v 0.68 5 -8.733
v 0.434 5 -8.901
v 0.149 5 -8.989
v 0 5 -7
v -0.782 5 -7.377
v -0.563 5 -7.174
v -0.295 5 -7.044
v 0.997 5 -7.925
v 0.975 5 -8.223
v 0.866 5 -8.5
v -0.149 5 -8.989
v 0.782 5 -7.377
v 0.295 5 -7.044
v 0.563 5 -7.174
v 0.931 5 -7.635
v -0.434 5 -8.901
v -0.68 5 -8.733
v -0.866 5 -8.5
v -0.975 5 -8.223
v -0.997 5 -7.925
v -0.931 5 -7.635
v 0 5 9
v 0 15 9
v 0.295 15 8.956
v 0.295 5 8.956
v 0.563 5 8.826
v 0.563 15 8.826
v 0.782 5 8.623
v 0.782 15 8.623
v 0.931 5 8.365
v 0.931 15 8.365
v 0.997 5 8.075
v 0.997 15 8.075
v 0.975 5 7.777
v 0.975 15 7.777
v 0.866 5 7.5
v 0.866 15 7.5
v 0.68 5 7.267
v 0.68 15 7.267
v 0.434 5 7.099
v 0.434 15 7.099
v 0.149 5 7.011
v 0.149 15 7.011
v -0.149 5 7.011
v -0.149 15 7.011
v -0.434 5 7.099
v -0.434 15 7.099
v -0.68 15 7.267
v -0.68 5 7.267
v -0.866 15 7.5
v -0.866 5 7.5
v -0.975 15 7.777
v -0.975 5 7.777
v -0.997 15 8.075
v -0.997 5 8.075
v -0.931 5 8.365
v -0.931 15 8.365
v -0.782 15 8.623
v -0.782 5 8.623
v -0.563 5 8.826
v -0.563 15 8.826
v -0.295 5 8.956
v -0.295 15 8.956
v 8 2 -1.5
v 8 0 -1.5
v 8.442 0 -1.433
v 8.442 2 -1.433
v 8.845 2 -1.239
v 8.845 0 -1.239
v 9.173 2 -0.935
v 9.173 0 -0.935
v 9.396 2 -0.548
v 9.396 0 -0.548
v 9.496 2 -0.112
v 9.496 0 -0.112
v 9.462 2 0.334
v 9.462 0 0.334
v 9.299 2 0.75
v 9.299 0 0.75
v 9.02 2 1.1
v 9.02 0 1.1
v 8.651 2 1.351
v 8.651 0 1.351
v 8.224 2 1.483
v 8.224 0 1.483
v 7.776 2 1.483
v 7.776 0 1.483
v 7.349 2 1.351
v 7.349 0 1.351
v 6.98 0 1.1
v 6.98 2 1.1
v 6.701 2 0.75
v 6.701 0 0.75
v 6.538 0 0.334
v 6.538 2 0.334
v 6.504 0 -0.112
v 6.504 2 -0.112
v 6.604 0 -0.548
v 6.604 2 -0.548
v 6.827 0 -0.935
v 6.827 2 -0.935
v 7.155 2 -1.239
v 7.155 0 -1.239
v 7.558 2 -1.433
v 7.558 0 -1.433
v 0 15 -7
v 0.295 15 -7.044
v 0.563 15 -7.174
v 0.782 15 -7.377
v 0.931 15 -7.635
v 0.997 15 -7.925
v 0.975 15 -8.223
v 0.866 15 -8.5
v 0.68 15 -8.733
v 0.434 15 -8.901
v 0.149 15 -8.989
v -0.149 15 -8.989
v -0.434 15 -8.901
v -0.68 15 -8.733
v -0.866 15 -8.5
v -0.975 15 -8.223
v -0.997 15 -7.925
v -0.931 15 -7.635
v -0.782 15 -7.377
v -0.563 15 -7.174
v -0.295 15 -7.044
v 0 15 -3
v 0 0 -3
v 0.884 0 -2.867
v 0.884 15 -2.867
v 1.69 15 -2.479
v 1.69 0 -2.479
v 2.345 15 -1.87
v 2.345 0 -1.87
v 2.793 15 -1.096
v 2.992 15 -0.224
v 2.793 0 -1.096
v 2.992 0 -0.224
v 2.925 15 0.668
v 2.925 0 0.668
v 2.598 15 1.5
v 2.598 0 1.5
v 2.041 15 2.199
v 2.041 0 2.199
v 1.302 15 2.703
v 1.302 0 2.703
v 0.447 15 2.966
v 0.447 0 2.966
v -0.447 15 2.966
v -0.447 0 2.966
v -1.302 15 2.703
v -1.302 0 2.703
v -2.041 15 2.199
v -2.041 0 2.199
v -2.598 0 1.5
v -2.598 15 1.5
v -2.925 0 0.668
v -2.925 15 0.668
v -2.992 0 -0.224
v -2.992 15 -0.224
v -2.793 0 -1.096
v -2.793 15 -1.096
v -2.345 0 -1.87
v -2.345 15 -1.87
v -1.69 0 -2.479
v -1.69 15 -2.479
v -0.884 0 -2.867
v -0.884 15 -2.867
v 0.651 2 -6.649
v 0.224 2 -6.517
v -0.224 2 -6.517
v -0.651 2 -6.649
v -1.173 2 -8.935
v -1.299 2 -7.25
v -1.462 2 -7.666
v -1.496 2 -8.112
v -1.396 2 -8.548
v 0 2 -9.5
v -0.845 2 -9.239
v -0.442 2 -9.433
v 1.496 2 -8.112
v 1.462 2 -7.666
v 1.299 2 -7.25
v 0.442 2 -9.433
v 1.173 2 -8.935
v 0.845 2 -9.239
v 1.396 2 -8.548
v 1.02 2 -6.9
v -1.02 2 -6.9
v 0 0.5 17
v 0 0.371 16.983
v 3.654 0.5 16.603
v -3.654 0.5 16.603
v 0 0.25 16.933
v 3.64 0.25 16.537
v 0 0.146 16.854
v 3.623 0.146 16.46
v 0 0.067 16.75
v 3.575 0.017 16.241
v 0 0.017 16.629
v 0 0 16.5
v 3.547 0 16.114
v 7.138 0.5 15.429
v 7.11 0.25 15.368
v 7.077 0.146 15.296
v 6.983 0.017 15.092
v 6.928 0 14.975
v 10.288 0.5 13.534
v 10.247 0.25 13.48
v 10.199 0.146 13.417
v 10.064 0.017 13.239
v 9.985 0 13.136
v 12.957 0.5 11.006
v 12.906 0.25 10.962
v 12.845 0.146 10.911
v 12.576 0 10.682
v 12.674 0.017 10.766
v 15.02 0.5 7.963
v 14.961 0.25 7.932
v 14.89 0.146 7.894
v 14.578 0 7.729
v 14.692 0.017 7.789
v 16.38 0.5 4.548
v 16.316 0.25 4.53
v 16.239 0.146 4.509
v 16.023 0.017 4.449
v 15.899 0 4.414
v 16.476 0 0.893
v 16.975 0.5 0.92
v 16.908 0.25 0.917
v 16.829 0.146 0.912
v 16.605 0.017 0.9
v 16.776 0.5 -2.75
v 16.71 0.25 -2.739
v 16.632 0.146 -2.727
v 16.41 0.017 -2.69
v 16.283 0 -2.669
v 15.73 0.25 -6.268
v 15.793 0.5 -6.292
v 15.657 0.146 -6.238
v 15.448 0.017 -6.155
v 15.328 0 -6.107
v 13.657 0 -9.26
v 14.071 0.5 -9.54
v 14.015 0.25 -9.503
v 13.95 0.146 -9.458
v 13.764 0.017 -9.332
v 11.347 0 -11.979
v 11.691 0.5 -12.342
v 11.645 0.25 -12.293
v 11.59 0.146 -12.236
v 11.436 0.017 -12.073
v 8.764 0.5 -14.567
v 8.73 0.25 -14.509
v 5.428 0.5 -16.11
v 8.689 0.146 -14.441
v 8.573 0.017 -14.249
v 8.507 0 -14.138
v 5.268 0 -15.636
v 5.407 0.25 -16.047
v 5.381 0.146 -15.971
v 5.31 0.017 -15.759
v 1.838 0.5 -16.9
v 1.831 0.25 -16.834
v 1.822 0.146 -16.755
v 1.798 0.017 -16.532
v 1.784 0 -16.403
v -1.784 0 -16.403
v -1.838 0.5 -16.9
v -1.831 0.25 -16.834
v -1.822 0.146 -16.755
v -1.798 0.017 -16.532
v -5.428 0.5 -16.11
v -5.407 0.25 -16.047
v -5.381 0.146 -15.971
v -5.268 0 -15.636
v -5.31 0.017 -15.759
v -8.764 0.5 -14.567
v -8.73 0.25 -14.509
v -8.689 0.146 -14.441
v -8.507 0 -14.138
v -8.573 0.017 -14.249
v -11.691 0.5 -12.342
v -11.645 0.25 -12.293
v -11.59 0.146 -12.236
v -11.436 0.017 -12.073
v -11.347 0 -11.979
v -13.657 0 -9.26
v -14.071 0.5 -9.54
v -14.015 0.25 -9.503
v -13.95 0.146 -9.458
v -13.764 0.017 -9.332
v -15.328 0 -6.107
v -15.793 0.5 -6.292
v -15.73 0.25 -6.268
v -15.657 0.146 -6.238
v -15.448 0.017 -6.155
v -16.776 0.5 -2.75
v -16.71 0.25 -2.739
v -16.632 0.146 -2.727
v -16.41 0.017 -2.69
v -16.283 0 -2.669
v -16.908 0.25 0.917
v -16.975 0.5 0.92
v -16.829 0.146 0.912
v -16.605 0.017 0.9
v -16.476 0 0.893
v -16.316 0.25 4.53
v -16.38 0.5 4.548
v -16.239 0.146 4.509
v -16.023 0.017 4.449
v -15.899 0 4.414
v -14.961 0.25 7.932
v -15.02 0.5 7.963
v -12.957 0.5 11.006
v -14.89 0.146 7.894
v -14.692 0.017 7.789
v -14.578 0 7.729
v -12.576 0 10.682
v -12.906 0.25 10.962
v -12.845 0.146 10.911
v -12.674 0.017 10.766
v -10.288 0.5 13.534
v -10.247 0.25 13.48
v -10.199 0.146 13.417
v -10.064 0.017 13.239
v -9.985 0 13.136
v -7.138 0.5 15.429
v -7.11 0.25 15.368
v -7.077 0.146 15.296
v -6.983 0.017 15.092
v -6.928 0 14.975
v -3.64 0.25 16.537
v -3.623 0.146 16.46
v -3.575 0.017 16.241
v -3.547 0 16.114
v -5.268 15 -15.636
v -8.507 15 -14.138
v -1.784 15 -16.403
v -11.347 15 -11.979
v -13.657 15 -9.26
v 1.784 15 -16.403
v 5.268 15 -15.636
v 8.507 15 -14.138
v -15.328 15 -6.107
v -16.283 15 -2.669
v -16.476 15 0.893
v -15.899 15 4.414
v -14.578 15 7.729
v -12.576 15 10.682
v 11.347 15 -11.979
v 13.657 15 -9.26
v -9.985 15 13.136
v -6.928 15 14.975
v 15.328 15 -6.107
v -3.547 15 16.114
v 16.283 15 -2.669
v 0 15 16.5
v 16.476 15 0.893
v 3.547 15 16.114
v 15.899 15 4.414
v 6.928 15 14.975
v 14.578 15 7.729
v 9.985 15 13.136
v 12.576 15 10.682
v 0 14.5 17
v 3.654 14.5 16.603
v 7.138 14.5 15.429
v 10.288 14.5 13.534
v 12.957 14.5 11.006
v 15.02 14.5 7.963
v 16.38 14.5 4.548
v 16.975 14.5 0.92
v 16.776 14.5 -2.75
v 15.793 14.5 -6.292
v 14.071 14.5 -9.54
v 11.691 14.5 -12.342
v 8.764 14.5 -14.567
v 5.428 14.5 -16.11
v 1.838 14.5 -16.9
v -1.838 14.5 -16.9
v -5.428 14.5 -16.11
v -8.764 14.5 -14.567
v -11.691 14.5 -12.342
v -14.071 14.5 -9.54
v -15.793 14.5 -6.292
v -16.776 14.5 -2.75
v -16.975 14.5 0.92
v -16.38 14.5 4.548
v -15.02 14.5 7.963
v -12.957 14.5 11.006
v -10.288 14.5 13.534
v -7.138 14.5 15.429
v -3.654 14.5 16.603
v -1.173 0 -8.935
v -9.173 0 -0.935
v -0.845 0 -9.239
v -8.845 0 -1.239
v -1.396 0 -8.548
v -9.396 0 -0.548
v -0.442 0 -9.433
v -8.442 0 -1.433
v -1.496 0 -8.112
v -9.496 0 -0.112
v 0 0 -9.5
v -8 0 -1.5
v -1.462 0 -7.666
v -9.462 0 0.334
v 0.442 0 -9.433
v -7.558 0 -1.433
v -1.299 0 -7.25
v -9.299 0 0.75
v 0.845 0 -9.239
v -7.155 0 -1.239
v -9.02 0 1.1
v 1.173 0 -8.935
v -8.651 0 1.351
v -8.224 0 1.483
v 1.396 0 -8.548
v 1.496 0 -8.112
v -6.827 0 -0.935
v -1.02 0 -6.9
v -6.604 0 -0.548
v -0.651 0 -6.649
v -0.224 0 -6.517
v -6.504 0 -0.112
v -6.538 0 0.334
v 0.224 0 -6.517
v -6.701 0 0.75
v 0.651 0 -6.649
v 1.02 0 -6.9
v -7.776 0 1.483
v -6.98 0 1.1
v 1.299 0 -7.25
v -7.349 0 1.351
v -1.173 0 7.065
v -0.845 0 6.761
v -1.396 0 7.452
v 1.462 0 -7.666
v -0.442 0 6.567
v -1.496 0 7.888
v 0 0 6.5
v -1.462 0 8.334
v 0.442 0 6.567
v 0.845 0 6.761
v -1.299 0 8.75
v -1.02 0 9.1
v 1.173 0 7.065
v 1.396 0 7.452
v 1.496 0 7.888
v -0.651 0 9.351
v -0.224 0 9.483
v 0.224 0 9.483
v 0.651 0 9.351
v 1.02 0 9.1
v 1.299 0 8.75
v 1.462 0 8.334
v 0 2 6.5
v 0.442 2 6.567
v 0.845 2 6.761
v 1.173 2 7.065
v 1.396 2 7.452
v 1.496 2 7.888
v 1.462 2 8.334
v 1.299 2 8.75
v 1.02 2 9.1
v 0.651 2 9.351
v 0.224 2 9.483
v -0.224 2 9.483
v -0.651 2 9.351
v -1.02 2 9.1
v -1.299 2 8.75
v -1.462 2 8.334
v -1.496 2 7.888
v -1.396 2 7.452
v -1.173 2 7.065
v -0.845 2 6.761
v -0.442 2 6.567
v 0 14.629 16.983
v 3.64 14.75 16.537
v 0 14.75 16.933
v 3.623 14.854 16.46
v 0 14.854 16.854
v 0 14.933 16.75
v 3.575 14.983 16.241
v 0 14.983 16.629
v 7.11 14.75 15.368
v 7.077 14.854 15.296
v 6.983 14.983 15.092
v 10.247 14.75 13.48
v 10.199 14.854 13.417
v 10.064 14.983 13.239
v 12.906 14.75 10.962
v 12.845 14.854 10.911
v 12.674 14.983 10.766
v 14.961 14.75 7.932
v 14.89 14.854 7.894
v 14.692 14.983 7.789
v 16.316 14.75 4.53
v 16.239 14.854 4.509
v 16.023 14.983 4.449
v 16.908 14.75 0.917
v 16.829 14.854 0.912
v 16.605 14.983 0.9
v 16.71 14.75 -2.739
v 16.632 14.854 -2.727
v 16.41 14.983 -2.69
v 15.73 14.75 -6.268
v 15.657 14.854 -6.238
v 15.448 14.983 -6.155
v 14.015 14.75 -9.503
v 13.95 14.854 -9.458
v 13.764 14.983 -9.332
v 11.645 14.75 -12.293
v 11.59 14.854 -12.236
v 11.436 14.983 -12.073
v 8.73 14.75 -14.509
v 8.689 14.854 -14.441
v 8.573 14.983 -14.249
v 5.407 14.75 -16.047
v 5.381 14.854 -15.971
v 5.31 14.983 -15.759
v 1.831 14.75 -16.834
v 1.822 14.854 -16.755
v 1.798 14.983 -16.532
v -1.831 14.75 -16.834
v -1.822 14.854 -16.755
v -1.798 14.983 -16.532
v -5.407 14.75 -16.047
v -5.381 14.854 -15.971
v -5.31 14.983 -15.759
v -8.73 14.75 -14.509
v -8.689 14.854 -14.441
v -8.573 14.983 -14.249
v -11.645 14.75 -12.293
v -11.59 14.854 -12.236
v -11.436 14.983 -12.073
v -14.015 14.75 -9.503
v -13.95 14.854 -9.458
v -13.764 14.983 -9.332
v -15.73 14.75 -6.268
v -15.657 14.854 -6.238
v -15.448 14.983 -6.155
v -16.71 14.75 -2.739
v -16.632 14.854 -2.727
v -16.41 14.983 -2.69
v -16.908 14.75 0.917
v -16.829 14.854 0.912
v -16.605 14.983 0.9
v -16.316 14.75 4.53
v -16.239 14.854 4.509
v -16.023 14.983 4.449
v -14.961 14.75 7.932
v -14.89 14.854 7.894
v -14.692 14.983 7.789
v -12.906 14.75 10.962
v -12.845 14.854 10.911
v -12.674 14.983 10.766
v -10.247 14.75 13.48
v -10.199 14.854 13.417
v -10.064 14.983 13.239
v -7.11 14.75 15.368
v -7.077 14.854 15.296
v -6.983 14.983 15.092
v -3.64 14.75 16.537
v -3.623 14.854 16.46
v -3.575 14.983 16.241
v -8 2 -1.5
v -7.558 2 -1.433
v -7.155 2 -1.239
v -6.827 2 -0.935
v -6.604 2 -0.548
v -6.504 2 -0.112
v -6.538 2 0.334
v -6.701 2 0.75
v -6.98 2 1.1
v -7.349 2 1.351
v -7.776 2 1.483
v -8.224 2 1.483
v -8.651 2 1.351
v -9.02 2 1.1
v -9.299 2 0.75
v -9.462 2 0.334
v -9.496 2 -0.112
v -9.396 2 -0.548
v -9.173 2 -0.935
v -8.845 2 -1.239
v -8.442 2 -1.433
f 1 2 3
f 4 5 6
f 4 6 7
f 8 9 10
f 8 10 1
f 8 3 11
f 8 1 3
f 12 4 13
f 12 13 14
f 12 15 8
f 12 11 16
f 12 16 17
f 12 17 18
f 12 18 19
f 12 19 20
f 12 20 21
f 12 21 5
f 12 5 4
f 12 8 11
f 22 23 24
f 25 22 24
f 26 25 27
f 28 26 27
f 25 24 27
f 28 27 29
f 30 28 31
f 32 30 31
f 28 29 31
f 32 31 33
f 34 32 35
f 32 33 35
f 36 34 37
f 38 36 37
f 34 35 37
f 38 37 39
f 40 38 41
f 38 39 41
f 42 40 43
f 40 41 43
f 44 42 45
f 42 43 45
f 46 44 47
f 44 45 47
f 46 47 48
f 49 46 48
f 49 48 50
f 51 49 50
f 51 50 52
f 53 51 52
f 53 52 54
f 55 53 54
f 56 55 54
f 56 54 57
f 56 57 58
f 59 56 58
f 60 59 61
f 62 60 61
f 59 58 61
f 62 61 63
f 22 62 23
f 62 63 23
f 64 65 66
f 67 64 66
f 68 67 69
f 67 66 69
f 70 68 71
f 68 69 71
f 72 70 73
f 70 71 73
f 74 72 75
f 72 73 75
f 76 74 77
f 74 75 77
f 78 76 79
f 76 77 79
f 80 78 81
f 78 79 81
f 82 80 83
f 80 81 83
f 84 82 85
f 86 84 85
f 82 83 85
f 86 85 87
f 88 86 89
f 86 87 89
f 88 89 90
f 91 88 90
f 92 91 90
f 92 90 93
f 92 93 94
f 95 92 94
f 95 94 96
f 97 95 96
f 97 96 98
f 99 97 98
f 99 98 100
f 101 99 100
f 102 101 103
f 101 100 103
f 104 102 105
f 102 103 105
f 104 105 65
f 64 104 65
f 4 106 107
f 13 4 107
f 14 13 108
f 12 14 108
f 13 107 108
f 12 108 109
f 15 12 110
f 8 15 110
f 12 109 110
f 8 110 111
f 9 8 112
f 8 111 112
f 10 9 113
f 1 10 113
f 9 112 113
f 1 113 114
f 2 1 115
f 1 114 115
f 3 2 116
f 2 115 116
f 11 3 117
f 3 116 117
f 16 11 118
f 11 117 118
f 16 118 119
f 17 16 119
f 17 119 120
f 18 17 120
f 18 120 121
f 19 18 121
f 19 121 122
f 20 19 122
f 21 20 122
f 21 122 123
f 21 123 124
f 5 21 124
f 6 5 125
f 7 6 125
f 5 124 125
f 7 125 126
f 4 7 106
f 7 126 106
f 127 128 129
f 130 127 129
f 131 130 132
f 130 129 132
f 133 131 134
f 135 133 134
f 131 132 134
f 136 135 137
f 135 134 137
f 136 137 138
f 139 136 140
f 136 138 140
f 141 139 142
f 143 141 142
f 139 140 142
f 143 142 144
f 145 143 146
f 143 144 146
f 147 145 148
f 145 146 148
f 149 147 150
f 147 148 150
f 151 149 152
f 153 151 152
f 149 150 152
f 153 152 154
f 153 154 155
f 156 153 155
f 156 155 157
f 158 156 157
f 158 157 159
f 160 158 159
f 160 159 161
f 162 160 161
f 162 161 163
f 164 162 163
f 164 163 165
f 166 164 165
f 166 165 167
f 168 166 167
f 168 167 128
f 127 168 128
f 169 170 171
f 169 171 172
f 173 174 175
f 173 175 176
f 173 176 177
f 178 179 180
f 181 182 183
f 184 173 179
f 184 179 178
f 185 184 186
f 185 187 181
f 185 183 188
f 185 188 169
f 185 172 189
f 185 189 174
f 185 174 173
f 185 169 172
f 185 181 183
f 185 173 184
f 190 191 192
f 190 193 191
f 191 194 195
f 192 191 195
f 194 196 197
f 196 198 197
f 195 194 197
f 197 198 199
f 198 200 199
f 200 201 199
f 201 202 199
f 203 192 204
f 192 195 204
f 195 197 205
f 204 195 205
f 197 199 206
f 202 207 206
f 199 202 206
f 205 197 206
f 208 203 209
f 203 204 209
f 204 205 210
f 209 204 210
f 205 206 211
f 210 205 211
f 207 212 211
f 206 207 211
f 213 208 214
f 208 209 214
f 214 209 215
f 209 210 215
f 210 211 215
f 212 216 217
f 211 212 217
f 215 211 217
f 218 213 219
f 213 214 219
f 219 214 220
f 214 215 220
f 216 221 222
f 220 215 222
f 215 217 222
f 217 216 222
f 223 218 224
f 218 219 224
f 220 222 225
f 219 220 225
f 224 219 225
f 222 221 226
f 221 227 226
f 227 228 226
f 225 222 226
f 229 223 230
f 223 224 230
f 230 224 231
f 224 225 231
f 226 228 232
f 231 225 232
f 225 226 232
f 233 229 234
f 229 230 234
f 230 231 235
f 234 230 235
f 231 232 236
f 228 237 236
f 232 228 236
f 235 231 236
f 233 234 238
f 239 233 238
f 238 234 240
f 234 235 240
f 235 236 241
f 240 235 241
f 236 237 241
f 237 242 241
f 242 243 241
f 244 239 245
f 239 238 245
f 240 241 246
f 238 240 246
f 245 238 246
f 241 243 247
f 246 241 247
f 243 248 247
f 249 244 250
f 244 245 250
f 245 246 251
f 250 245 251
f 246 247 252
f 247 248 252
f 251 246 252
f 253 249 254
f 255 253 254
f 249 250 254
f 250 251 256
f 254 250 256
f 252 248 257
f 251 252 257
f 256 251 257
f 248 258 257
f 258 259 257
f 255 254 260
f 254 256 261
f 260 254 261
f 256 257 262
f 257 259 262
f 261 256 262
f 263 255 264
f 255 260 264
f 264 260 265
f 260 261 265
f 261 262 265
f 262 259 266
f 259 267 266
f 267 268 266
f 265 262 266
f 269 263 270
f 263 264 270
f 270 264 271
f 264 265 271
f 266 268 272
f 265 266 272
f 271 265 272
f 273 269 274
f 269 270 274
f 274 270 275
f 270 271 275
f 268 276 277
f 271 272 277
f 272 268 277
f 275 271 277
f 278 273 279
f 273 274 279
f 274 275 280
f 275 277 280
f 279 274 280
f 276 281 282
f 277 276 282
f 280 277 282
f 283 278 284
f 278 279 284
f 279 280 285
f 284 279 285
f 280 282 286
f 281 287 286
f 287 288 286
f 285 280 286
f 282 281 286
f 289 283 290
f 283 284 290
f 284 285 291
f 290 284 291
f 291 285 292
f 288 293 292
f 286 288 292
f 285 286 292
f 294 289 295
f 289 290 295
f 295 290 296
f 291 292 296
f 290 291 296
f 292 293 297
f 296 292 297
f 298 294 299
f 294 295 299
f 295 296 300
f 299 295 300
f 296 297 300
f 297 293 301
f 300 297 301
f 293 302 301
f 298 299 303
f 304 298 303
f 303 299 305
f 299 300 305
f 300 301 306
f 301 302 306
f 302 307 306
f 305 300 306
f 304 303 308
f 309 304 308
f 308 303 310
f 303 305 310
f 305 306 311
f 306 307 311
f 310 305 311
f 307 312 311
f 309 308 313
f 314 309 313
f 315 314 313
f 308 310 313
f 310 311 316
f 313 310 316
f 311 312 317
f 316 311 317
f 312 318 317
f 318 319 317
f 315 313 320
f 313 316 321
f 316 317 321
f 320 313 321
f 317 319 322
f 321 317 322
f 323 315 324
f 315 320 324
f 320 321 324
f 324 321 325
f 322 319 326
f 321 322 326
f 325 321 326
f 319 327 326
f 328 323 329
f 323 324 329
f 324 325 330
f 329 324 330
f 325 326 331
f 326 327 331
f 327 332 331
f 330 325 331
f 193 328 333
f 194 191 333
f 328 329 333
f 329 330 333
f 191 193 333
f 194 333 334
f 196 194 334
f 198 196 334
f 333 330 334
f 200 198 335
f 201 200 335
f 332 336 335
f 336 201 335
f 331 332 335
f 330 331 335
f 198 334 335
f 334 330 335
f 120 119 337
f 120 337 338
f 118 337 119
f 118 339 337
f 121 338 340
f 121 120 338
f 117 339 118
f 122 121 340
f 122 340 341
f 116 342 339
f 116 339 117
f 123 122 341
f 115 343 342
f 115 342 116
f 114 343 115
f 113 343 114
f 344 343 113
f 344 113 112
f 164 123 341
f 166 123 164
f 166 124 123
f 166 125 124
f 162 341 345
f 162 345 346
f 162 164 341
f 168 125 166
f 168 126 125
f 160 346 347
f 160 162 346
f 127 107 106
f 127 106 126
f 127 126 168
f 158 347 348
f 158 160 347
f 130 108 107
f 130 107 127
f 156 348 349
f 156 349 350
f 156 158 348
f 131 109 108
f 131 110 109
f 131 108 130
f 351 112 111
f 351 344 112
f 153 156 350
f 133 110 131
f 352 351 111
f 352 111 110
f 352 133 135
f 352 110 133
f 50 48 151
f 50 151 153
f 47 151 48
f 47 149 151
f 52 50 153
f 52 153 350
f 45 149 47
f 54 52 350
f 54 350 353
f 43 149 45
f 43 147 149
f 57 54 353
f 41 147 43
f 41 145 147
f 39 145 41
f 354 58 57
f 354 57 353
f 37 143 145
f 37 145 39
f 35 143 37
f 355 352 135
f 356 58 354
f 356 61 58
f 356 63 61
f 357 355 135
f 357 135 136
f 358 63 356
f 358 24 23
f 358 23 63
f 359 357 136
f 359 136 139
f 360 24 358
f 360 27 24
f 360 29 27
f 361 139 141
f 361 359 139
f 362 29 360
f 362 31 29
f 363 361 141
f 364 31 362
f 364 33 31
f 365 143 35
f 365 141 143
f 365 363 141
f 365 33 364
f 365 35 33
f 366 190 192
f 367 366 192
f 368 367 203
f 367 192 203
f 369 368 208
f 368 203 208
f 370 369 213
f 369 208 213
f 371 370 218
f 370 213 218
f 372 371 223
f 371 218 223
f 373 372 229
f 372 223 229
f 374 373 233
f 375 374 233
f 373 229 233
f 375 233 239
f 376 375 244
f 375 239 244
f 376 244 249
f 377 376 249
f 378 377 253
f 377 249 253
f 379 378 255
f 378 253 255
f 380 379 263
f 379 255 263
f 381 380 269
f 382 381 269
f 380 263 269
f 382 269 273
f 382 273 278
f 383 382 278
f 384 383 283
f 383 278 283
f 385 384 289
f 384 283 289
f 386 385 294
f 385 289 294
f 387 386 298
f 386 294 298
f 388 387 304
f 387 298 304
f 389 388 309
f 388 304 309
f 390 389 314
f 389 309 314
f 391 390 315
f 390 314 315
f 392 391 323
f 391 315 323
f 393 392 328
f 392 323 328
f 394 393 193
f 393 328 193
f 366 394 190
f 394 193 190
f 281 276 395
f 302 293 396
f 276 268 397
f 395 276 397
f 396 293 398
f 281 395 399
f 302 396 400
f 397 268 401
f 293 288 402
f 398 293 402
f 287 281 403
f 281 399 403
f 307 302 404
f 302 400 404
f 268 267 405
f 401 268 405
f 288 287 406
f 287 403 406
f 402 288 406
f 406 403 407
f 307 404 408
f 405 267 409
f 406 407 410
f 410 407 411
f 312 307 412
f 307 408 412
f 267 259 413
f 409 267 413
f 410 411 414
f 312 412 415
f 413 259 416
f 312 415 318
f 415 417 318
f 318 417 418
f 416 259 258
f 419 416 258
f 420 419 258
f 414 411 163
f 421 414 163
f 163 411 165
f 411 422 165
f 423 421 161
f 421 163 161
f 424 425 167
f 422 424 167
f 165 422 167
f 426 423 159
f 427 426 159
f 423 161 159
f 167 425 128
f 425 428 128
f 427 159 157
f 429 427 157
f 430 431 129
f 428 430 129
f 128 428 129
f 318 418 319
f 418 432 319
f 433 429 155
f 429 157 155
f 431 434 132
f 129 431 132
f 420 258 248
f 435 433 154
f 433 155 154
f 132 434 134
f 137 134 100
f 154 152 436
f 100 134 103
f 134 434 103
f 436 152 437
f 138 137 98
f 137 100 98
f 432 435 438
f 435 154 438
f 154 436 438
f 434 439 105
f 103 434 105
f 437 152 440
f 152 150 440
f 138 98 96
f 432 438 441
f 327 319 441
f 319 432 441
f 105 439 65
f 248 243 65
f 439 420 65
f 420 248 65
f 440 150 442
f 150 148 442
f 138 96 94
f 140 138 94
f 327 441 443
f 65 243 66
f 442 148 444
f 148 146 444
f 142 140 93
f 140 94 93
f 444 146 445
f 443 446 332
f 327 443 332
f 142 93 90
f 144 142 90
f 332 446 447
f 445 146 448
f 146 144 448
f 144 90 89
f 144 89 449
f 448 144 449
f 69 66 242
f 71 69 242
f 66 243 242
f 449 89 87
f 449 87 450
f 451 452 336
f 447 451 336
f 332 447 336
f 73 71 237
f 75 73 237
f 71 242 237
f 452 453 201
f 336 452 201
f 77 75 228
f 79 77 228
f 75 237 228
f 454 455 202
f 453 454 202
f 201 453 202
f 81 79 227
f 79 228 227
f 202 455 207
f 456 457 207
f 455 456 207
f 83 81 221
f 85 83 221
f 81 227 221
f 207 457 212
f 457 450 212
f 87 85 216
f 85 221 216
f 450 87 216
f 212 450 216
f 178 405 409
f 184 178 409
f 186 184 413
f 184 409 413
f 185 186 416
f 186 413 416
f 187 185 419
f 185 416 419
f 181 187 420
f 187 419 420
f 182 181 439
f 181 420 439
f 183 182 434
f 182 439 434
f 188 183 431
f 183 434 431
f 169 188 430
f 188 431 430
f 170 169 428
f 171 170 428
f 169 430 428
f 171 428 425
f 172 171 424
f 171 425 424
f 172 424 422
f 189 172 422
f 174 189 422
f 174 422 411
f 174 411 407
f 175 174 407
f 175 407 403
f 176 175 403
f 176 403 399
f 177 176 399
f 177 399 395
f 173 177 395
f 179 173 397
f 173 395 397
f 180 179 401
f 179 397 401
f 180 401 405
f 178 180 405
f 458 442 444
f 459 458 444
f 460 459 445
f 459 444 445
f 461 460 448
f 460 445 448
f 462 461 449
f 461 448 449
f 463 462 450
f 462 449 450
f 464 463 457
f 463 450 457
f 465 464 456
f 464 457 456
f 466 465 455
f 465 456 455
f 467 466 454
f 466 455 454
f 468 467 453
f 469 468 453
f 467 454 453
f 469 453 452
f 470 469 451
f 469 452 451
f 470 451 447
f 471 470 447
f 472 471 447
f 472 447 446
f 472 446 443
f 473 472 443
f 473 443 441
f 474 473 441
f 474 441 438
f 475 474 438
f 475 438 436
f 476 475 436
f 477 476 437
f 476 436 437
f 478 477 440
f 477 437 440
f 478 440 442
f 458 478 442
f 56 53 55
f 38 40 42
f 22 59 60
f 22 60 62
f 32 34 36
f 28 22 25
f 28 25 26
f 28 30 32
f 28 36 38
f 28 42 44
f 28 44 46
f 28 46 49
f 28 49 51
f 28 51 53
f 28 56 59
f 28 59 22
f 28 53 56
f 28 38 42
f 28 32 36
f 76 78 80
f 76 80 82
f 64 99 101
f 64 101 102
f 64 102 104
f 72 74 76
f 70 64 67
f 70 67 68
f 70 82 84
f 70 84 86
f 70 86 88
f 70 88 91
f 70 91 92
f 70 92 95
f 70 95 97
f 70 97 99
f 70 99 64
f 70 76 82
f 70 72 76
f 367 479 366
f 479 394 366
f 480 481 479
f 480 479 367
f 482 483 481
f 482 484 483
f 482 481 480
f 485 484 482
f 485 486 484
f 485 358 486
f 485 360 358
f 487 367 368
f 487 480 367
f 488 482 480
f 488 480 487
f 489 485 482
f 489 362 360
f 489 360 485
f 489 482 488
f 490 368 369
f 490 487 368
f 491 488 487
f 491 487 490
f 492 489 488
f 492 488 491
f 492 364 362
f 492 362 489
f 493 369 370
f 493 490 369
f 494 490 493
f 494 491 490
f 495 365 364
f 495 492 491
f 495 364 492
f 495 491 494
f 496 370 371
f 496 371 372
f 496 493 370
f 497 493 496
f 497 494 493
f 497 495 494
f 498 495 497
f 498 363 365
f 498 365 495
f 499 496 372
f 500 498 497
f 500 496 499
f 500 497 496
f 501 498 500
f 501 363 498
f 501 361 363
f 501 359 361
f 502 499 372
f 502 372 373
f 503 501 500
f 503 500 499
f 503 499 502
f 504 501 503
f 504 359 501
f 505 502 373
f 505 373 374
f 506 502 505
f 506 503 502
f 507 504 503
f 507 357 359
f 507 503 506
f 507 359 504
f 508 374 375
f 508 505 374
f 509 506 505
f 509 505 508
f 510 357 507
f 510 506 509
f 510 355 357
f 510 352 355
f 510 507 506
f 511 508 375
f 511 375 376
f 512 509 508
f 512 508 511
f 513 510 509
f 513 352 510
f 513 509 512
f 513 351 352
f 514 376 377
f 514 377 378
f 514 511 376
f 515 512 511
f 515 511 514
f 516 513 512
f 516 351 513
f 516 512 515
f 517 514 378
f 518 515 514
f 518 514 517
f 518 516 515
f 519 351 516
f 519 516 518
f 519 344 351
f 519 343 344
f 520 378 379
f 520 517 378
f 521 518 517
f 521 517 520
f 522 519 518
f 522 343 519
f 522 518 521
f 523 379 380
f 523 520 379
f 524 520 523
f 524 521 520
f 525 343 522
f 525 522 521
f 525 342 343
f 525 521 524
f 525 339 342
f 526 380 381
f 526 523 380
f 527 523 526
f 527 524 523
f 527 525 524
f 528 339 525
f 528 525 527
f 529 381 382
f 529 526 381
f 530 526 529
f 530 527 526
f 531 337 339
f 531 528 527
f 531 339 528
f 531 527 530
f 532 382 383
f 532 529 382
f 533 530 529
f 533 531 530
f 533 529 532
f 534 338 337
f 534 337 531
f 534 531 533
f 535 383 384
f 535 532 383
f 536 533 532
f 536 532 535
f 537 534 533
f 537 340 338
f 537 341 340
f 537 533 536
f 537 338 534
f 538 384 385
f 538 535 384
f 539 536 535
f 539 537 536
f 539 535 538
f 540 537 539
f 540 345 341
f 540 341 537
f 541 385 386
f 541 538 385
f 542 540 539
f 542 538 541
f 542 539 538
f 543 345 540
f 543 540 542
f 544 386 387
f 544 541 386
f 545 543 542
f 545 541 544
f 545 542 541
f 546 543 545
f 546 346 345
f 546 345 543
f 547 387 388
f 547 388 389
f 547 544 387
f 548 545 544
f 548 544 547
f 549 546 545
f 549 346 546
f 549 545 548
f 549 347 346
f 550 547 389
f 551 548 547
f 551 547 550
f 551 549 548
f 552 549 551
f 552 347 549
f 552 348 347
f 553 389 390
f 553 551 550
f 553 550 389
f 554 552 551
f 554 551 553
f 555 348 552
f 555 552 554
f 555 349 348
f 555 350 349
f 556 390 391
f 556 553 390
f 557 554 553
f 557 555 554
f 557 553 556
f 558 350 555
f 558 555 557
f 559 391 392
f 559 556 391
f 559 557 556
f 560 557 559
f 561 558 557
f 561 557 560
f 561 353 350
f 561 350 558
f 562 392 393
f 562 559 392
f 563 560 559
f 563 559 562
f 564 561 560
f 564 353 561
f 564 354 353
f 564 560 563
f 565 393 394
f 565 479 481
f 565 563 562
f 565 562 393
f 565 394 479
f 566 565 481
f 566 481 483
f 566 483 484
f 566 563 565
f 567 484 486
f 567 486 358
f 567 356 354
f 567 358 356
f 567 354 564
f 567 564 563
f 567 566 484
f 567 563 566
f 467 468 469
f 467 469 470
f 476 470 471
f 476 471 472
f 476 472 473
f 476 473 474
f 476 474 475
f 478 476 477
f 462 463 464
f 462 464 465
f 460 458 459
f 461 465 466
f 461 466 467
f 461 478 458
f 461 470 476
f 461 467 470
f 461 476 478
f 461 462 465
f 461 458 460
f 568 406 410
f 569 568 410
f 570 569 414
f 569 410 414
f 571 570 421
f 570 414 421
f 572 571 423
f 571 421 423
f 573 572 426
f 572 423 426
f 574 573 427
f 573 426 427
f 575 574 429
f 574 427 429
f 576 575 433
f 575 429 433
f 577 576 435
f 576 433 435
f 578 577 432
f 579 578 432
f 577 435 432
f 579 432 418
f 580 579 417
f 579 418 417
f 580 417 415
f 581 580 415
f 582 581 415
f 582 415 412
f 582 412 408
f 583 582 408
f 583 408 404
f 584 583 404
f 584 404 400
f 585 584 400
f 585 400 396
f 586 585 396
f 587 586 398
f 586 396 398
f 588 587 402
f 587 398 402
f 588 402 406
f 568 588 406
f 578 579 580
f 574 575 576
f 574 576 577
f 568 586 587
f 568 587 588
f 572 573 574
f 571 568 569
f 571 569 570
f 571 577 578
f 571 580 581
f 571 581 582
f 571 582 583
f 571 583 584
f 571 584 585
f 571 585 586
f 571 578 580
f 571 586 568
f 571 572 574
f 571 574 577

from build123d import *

# Parameters (mm, degrees)
SKETCH_1_R          = 17
EXTRUDE_1_DEPTH     = 15
SKETCH_2_R          = 1
CUT_EXTRUDE_1_DEPTH = 10
SKETCH_4_R          = 1.5
CUT_EXTRUDE_3_DEPTH = 2
CUT_EXTRUDE_4_REACH = 30.337
SKETCH_5_R          = 3
FILLET_1_R          = 0.5


with BuildPart() as part:
    # 草图1 → 凸台-拉伸1 (new body)
    with BuildSketch(Plane(origin=(0, 0, 0), x_dir=(1, 0, 0), z_dir=(0, 1, 0))):
        with Locations(Location((0, 0, 0), (0, 0, 270))):
            Circle(SKETCH_1_R)
    extrude(amount=EXTRUDE_1_DEPTH)

    # 草图2 → 切除-拉伸1 (cut)
    with BuildSketch(Plane(origin=(0, 15, 0), x_dir=(1, 0, 0), z_dir=(0, 1, 0))):
        with Locations(Location((0, 8, 0), (0, 0, 270))):
            Circle(SKETCH_2_R)
        with Locations(Location((0, -8, 0), (0, 0, 270))):
            Circle(SKETCH_2_R)
    extrude(amount=-CUT_EXTRUDE_1_DEPTH, mode=Mode.SUBTRACT)

    # 草图4 → 切除-拉伸3 (cut)
    with BuildSketch(Plane.XZ):
        with Locations(Location((0, 8, 0), (0, 0, 270))):
            Circle(SKETCH_4_R)
        with Locations(Location((8, 0, 0), (0, 0, 270))):
            Circle(SKETCH_4_R)
        with Locations(Location((0, -8, 0), (0, 0, 270))):
            Circle(SKETCH_4_R)
        with Locations(Location((-8, 0, 0), (0, 0, 270))):
            Circle(SKETCH_4_R)
    extrude(amount=-CUT_EXTRUDE_3_DEPTH, mode=Mode.SUBTRACT)

    # 草图5 → 切除-拉伸4 (cut, up to next)
    with BuildSketch(Plane.XZ, mode=Mode.PRIVATE) as cut_extrude_4_sk1:
        with Locations(Location((0, 0, 0), (0, 0, 270))):
            Circle(SKETCH_5_R)
    cut_extrude_4_tool1 = extrude(cut_extrude_4_sk1.sketch, amount=-CUT_EXTRUDE_4_REACH, mode=Mode.PRIVATE) & part.part
    add(cut_extrude_4_tool1.solids().sort_by_distance((0, 0, 0))[0], mode=Mode.SUBTRACT)

    # 圆角1
    fillet_1_edges = [part.edges().sort_by_distance(p)[0] for p in [
        (0, 0, -17),
        (0, 15, -17),
    ]]
    fillet(fillet_1_edges, radius=FILLET_1_R)


solid = part.part
